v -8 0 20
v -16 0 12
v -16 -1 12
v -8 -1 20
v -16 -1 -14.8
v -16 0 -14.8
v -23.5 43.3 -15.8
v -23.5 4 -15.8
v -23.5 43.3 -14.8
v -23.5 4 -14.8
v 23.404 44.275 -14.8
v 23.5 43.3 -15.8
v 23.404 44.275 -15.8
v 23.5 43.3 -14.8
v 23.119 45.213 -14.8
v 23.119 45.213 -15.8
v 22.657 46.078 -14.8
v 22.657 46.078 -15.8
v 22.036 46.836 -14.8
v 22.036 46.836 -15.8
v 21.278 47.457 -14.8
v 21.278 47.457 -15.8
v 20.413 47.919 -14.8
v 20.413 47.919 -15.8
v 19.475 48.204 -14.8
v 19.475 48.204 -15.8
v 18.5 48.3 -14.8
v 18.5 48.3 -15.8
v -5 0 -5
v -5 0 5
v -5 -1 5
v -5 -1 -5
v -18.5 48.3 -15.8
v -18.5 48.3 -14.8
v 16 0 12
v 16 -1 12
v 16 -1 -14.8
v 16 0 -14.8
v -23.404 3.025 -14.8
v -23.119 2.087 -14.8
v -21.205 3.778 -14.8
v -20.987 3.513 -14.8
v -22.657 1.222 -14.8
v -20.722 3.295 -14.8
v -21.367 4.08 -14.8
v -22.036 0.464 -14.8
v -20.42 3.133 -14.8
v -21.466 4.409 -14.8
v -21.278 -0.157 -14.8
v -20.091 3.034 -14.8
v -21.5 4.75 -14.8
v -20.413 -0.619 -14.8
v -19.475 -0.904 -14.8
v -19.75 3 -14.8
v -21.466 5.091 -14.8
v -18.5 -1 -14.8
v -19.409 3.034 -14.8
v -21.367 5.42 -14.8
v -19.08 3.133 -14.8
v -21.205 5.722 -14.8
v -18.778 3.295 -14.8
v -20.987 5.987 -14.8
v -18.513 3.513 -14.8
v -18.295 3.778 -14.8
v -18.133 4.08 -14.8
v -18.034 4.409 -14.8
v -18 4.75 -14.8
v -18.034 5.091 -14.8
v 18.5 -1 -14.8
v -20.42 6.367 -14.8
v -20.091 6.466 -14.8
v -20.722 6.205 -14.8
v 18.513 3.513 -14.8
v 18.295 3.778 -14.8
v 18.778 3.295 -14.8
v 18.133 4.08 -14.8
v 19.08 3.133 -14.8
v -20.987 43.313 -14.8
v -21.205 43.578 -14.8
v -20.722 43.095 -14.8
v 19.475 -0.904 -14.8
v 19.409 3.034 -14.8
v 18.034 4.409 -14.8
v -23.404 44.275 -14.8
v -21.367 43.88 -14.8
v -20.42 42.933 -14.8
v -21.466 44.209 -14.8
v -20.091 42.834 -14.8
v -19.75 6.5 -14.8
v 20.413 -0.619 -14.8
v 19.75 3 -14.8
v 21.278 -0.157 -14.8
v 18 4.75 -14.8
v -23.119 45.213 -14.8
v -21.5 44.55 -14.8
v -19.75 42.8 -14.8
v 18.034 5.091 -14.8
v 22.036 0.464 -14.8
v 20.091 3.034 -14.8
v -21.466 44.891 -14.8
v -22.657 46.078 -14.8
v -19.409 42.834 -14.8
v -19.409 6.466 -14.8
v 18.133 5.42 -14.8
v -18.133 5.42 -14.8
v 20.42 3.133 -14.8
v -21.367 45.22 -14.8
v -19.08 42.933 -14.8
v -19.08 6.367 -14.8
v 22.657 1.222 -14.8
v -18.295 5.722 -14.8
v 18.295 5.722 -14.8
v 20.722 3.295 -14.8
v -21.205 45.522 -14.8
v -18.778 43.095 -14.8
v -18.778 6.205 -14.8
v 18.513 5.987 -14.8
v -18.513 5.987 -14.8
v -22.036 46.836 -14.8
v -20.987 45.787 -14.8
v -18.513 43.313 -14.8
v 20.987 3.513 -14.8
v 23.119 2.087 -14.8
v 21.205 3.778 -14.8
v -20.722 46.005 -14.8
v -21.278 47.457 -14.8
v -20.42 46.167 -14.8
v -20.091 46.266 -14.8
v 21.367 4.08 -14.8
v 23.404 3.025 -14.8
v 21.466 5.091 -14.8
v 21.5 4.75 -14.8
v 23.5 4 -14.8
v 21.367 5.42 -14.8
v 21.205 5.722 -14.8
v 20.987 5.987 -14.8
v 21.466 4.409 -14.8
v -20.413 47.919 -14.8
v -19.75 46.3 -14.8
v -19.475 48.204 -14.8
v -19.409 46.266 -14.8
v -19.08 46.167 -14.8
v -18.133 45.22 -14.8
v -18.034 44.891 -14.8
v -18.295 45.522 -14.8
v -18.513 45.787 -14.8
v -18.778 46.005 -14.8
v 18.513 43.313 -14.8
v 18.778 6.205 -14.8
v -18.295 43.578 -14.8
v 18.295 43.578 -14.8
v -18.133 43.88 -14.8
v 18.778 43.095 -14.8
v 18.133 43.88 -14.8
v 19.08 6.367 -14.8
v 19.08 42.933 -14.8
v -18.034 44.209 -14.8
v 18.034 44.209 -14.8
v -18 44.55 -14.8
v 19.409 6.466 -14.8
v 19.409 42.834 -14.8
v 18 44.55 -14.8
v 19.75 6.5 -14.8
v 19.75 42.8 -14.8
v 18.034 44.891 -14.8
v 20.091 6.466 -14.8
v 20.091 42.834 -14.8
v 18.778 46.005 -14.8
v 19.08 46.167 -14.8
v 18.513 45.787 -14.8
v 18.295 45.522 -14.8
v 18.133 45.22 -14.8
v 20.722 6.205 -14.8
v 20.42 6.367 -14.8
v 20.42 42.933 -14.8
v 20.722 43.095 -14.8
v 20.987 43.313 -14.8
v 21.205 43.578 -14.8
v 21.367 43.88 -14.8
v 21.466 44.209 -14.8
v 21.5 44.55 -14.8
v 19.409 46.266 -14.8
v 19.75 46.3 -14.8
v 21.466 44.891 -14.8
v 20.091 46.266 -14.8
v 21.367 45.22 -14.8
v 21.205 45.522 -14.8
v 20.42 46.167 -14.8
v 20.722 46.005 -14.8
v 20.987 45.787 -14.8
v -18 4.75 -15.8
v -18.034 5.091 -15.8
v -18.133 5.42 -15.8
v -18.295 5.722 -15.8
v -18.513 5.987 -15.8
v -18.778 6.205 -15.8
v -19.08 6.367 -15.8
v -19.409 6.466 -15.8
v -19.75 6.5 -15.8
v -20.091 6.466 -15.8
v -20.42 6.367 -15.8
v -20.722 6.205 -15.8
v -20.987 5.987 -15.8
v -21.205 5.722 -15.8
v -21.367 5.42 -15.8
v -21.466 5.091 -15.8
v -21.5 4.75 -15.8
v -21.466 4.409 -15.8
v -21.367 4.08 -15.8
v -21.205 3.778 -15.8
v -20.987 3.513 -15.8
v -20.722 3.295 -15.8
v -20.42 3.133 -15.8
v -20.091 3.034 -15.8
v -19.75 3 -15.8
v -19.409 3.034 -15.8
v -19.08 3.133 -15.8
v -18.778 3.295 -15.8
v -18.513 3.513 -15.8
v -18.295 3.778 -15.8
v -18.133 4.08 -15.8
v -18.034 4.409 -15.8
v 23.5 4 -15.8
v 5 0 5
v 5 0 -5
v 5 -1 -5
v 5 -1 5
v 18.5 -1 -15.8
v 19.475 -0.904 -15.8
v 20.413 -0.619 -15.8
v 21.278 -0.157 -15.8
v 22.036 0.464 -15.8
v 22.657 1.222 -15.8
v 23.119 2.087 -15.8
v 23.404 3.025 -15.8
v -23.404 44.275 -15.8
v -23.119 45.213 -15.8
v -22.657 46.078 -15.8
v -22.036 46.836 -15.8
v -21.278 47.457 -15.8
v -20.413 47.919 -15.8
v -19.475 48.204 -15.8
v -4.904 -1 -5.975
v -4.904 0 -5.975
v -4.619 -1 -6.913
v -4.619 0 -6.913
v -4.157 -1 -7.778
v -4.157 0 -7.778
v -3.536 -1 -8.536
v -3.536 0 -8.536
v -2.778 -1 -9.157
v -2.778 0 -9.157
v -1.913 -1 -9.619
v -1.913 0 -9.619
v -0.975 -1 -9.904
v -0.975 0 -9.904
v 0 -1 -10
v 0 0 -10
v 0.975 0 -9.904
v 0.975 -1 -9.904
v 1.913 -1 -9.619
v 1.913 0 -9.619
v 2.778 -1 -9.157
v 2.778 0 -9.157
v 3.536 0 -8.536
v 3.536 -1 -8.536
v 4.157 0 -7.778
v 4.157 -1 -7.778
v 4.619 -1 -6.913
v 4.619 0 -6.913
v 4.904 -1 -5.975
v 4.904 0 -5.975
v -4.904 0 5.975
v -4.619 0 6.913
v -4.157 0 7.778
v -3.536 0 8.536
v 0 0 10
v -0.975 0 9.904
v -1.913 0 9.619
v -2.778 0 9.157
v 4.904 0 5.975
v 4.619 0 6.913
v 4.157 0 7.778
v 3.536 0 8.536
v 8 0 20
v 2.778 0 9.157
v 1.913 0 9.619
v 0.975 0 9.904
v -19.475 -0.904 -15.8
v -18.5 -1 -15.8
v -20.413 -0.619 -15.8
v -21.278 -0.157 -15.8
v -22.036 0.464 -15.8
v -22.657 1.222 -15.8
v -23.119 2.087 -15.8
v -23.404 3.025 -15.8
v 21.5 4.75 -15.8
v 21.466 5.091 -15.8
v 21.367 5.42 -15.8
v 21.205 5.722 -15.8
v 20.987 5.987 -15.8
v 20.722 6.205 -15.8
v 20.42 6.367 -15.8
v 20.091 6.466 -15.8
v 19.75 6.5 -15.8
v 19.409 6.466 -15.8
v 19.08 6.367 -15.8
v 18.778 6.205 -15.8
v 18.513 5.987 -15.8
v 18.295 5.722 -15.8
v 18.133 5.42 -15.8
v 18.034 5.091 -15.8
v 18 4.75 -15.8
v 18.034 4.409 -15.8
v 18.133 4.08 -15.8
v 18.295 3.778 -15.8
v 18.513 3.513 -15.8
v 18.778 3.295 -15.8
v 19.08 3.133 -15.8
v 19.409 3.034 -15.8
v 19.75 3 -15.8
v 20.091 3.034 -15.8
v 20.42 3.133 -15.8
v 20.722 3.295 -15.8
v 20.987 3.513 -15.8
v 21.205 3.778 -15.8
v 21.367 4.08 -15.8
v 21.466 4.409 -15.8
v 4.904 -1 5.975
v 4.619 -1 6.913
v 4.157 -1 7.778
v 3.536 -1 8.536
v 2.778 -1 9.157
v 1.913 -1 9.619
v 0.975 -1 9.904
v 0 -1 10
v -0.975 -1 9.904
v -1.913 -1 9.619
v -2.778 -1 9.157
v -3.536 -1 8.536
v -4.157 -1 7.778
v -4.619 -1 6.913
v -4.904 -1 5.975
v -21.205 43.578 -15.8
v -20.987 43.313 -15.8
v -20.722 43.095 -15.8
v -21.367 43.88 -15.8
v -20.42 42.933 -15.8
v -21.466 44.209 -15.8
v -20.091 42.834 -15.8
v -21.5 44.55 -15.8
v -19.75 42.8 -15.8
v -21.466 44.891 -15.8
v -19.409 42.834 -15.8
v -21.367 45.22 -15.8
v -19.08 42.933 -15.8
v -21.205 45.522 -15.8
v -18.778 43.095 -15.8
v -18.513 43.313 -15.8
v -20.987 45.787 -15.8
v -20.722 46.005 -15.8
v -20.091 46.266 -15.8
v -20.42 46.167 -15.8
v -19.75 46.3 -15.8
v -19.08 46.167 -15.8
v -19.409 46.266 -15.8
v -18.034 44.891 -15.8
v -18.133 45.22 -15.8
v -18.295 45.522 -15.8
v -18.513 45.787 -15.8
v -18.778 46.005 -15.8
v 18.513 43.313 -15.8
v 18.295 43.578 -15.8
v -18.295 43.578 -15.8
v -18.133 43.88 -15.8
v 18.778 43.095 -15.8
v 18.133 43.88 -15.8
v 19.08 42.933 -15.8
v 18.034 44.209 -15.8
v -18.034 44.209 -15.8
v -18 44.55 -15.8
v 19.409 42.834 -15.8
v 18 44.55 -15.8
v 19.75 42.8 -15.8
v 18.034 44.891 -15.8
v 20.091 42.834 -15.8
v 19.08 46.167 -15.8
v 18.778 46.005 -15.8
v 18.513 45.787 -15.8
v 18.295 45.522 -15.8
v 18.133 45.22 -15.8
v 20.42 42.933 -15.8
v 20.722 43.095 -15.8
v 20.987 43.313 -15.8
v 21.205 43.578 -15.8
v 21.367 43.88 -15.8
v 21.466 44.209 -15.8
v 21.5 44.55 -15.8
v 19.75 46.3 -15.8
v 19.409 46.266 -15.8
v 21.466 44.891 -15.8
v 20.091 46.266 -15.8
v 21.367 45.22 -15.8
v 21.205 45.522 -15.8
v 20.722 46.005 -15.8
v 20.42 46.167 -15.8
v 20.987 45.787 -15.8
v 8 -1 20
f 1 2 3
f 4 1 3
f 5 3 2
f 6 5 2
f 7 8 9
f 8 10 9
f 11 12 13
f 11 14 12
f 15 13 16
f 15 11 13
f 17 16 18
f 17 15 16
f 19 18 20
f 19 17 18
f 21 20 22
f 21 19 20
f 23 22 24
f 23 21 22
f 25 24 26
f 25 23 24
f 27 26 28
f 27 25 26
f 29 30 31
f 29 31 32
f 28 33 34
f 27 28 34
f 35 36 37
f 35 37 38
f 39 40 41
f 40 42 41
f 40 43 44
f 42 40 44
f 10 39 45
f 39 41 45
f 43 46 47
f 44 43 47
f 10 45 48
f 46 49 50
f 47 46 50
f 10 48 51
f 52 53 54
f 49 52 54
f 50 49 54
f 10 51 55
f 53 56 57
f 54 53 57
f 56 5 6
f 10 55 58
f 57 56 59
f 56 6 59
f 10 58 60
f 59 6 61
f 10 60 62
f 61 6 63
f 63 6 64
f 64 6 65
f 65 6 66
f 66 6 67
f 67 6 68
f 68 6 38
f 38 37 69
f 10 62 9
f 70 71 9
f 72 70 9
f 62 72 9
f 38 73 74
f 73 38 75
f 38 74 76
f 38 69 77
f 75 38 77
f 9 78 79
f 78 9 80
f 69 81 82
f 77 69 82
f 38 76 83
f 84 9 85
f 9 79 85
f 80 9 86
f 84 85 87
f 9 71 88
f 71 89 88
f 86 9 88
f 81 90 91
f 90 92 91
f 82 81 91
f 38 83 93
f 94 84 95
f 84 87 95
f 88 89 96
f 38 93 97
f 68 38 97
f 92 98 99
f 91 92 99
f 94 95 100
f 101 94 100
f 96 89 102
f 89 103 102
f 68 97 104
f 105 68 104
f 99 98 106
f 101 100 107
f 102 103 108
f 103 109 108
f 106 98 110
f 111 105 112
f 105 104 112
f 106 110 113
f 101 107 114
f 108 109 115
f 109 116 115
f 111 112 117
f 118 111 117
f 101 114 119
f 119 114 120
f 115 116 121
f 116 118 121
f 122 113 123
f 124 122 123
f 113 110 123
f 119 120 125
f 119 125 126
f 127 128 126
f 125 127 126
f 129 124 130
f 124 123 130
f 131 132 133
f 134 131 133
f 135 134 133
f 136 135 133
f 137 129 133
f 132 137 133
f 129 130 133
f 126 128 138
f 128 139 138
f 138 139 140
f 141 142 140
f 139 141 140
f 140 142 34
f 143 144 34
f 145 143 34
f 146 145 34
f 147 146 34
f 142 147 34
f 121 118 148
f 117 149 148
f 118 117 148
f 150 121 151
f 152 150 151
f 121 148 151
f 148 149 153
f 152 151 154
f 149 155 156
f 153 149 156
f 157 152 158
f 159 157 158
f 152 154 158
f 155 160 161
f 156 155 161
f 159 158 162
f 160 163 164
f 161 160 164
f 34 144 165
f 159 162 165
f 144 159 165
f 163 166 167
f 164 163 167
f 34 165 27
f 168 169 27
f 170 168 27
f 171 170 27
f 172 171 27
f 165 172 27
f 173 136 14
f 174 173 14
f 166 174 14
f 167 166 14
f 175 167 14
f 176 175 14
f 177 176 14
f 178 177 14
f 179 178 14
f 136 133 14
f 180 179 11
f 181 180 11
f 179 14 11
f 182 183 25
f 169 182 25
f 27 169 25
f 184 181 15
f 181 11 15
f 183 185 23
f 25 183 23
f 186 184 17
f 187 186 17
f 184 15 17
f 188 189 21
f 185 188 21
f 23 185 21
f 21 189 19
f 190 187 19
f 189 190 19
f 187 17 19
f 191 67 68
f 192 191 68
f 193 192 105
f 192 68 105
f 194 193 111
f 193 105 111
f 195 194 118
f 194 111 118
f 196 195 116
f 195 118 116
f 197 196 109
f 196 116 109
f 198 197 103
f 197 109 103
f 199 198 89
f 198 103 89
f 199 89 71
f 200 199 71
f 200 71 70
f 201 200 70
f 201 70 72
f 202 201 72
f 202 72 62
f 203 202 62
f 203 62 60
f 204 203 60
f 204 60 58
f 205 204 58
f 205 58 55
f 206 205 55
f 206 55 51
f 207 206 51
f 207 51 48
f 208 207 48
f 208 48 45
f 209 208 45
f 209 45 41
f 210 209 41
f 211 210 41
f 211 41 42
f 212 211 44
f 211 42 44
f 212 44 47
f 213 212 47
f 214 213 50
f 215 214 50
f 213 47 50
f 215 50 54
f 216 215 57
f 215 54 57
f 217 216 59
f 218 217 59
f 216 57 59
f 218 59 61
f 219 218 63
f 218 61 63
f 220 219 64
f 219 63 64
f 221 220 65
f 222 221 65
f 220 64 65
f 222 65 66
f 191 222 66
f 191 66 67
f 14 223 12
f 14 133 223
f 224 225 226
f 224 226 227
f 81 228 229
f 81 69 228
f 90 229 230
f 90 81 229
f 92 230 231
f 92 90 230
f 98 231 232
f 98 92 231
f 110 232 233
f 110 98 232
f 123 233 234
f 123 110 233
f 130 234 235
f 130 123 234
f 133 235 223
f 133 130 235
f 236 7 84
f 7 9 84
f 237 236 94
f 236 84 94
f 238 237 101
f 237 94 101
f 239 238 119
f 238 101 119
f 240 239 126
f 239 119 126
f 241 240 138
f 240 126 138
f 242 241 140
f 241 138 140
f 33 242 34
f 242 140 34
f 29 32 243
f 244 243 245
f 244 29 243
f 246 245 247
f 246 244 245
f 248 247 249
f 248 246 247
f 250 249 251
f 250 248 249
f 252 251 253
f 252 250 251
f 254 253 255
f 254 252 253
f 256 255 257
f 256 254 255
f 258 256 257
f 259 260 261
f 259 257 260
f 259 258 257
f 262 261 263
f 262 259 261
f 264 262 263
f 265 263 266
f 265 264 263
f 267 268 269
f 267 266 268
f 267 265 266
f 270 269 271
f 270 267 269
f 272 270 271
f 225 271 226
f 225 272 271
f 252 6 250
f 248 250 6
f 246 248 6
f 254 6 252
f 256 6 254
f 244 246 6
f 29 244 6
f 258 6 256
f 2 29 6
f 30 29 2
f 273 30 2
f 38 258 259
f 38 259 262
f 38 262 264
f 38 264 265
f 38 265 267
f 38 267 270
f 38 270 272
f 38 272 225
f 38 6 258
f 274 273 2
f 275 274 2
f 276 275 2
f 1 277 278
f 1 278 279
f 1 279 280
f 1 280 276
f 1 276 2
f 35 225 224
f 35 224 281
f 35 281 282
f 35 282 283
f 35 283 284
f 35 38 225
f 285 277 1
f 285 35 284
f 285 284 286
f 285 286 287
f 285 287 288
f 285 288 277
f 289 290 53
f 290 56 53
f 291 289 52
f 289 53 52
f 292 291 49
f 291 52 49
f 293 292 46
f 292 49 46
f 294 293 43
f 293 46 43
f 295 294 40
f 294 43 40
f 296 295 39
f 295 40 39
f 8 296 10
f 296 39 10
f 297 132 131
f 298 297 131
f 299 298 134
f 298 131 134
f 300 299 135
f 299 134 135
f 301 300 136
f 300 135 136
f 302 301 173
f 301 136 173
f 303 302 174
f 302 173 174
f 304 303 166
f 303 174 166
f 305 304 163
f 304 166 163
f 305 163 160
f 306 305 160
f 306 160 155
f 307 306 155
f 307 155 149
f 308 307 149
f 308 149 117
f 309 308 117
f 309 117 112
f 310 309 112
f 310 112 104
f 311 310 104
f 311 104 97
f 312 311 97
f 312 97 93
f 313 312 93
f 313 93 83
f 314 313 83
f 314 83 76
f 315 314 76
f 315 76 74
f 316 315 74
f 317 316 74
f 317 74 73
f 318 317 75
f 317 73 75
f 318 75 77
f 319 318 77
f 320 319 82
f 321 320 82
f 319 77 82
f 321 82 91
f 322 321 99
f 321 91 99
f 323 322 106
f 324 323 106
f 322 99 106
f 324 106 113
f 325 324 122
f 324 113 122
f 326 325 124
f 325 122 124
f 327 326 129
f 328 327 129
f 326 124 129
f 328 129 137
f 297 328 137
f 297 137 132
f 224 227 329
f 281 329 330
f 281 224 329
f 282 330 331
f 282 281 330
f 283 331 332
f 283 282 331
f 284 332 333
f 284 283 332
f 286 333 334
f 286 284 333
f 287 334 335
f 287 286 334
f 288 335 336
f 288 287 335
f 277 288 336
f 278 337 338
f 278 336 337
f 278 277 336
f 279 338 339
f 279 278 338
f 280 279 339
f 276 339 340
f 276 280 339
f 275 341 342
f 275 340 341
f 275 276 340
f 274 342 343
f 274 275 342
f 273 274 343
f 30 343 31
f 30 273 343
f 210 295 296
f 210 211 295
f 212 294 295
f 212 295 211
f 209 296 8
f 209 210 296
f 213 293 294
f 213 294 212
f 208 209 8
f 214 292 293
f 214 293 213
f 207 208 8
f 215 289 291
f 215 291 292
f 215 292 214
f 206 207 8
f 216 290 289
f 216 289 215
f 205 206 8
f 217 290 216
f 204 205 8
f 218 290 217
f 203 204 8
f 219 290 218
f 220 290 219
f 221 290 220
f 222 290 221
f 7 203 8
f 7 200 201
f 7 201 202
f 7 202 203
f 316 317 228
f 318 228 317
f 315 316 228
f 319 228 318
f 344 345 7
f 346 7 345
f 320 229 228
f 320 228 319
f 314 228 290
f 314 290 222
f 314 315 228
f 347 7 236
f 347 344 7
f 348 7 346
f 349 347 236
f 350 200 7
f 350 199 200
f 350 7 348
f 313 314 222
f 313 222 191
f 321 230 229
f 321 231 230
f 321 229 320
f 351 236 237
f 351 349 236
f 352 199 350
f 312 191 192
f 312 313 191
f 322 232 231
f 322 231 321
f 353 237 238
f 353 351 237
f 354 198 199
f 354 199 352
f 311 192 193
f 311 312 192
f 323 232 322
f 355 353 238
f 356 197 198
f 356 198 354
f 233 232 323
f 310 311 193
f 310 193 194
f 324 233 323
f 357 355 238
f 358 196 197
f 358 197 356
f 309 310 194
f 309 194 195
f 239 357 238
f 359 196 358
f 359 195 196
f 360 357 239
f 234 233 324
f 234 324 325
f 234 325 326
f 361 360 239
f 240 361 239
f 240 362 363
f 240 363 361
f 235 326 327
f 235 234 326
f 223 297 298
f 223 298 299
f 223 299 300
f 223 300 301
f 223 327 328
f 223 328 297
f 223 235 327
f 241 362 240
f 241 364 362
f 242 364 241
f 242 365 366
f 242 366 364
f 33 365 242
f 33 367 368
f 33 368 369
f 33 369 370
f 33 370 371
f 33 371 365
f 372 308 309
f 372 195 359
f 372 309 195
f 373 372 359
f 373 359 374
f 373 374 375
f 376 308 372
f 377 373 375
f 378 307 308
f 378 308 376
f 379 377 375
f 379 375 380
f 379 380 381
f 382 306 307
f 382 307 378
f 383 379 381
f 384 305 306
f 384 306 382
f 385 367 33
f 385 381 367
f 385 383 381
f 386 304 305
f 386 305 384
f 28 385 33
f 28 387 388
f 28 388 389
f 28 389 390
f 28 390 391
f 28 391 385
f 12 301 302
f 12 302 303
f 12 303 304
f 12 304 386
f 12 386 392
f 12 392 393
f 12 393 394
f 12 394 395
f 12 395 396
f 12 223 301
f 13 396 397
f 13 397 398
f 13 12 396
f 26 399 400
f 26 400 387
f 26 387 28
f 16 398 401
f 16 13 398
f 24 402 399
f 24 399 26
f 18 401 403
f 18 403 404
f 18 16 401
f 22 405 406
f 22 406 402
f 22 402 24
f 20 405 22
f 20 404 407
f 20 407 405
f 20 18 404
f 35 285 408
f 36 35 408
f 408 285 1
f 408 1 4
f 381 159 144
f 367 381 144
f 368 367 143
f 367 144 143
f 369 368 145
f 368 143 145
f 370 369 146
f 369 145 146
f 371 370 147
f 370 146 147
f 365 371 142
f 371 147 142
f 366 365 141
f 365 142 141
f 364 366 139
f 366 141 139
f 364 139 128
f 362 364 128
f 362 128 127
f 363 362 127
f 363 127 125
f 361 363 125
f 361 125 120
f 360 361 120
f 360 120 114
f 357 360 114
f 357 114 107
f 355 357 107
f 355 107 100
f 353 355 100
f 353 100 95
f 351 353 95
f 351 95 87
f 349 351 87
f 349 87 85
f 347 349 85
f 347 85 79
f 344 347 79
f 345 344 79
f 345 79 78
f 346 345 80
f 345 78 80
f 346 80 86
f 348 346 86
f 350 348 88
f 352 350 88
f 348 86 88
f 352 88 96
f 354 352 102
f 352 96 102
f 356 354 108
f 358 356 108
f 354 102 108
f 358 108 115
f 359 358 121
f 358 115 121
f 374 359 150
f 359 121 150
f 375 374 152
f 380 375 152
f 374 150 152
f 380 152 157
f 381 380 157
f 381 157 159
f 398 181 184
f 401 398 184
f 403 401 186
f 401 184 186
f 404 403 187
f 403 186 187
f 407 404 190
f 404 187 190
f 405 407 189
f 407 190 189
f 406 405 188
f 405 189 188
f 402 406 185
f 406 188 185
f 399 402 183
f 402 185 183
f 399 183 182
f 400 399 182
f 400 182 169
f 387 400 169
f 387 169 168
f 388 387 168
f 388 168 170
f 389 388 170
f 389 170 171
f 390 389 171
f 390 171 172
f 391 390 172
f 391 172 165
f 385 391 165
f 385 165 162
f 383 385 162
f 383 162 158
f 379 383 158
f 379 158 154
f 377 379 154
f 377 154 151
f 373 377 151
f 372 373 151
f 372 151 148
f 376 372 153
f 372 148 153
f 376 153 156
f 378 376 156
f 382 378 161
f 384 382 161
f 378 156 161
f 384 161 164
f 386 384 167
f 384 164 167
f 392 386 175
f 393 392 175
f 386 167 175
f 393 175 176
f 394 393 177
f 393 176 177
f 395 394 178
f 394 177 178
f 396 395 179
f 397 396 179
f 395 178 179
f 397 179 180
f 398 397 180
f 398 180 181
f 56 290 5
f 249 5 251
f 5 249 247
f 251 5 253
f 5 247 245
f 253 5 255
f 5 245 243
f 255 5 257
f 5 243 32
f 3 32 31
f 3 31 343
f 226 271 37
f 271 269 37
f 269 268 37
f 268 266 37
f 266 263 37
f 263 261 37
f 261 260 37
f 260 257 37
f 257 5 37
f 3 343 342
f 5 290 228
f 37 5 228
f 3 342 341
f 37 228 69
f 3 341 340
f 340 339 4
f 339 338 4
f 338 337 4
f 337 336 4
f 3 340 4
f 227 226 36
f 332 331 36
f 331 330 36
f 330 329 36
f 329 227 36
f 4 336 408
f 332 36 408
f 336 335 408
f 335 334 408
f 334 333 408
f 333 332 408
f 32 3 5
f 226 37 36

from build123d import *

# Parameters (mm, degrees)
F1_DEPTH      = 16
F1_DEPTH_BACK = 16
F2_W          = 49.3
F2_H          = 1
F3_DEPTH      = 23.5
F3_DEPTH_BACK = 23.5
F5_SIZE       = 8
F6_DEPTH      = 5
F7_R          = 5
F8_R          = 1.75
F9_DEPTH      = 25


with BuildPart() as f1:
    # F0 (on Right) → F1 (new body, two sides)
    with BuildSketch(Plane.YZ) as f1_sk:
        Polygon((0, 20), (-1, 20), (-1, -15.8), (0, -14.8), align=None)
    extrude(amount=F1_DEPTH)
    extrude(f1_sk.sketch, amount=-F1_DEPTH_BACK)

    # F2 (on Right) → F3 (join, two sides)
    with BuildSketch(Plane.YZ) as f3_sk:
        with Locations((23.65, -15.3)):
            Rectangle(F2_W, F2_H)
    extrude(amount=F3_DEPTH)
    extrude(f3_sk.sketch, amount=-F3_DEPTH_BACK)

    # F5
    f5_edges = [f1.edges().sort_by_distance(p)[0] for p in [
        (-16, -0.5, 20),
        (16, -0.5, 20),
    ]]
    chamfer(f5_edges, length=F5_SIZE)

    # F4 (on Front) → F6 (cut)
    with BuildSketch(Plane.XZ):
        with BuildLine():
            Line((5, -5), (5, 5))
            ThreePointArc((5, 5), (0, 10), (-5, 5))
            Line((-5, 5), (-5, -5))
            ThreePointArc((-5, -5), (0, -10), (5, -5))
        make_face()
    extrude(amount=F6_DEPTH, mode=Mode.SUBTRACT)

    # F7
    f7_edges = [f1.edges().sort_by_distance(p)[0] for p in [
        (23.5, 48.3, -15.3),
        (-23.5, 48.3, -15.3),
        (23.5, -1, -15.3),
        (-23.5, -1, -15.3),
    ]]
    fillet(f7_edges, radius=F7_R)

    # F8 (on face) → F9 (cut)
    with BuildSketch(Plane.XY.offset(-14.8)):
        with Locations((-19.75, 44.55)):
            Circle(F8_R)
        with Locations((-19.75, 4.75)):
            Circle(F8_R)
        with Locations((19.75, 4.75)):
            Circle(F8_R)
        with Locations((19.75, 44.55)):
            Circle(F8_R)
    extrude(amount=-F9_DEPTH, mode=Mode.SUBTRACT)


solid = f1.part
